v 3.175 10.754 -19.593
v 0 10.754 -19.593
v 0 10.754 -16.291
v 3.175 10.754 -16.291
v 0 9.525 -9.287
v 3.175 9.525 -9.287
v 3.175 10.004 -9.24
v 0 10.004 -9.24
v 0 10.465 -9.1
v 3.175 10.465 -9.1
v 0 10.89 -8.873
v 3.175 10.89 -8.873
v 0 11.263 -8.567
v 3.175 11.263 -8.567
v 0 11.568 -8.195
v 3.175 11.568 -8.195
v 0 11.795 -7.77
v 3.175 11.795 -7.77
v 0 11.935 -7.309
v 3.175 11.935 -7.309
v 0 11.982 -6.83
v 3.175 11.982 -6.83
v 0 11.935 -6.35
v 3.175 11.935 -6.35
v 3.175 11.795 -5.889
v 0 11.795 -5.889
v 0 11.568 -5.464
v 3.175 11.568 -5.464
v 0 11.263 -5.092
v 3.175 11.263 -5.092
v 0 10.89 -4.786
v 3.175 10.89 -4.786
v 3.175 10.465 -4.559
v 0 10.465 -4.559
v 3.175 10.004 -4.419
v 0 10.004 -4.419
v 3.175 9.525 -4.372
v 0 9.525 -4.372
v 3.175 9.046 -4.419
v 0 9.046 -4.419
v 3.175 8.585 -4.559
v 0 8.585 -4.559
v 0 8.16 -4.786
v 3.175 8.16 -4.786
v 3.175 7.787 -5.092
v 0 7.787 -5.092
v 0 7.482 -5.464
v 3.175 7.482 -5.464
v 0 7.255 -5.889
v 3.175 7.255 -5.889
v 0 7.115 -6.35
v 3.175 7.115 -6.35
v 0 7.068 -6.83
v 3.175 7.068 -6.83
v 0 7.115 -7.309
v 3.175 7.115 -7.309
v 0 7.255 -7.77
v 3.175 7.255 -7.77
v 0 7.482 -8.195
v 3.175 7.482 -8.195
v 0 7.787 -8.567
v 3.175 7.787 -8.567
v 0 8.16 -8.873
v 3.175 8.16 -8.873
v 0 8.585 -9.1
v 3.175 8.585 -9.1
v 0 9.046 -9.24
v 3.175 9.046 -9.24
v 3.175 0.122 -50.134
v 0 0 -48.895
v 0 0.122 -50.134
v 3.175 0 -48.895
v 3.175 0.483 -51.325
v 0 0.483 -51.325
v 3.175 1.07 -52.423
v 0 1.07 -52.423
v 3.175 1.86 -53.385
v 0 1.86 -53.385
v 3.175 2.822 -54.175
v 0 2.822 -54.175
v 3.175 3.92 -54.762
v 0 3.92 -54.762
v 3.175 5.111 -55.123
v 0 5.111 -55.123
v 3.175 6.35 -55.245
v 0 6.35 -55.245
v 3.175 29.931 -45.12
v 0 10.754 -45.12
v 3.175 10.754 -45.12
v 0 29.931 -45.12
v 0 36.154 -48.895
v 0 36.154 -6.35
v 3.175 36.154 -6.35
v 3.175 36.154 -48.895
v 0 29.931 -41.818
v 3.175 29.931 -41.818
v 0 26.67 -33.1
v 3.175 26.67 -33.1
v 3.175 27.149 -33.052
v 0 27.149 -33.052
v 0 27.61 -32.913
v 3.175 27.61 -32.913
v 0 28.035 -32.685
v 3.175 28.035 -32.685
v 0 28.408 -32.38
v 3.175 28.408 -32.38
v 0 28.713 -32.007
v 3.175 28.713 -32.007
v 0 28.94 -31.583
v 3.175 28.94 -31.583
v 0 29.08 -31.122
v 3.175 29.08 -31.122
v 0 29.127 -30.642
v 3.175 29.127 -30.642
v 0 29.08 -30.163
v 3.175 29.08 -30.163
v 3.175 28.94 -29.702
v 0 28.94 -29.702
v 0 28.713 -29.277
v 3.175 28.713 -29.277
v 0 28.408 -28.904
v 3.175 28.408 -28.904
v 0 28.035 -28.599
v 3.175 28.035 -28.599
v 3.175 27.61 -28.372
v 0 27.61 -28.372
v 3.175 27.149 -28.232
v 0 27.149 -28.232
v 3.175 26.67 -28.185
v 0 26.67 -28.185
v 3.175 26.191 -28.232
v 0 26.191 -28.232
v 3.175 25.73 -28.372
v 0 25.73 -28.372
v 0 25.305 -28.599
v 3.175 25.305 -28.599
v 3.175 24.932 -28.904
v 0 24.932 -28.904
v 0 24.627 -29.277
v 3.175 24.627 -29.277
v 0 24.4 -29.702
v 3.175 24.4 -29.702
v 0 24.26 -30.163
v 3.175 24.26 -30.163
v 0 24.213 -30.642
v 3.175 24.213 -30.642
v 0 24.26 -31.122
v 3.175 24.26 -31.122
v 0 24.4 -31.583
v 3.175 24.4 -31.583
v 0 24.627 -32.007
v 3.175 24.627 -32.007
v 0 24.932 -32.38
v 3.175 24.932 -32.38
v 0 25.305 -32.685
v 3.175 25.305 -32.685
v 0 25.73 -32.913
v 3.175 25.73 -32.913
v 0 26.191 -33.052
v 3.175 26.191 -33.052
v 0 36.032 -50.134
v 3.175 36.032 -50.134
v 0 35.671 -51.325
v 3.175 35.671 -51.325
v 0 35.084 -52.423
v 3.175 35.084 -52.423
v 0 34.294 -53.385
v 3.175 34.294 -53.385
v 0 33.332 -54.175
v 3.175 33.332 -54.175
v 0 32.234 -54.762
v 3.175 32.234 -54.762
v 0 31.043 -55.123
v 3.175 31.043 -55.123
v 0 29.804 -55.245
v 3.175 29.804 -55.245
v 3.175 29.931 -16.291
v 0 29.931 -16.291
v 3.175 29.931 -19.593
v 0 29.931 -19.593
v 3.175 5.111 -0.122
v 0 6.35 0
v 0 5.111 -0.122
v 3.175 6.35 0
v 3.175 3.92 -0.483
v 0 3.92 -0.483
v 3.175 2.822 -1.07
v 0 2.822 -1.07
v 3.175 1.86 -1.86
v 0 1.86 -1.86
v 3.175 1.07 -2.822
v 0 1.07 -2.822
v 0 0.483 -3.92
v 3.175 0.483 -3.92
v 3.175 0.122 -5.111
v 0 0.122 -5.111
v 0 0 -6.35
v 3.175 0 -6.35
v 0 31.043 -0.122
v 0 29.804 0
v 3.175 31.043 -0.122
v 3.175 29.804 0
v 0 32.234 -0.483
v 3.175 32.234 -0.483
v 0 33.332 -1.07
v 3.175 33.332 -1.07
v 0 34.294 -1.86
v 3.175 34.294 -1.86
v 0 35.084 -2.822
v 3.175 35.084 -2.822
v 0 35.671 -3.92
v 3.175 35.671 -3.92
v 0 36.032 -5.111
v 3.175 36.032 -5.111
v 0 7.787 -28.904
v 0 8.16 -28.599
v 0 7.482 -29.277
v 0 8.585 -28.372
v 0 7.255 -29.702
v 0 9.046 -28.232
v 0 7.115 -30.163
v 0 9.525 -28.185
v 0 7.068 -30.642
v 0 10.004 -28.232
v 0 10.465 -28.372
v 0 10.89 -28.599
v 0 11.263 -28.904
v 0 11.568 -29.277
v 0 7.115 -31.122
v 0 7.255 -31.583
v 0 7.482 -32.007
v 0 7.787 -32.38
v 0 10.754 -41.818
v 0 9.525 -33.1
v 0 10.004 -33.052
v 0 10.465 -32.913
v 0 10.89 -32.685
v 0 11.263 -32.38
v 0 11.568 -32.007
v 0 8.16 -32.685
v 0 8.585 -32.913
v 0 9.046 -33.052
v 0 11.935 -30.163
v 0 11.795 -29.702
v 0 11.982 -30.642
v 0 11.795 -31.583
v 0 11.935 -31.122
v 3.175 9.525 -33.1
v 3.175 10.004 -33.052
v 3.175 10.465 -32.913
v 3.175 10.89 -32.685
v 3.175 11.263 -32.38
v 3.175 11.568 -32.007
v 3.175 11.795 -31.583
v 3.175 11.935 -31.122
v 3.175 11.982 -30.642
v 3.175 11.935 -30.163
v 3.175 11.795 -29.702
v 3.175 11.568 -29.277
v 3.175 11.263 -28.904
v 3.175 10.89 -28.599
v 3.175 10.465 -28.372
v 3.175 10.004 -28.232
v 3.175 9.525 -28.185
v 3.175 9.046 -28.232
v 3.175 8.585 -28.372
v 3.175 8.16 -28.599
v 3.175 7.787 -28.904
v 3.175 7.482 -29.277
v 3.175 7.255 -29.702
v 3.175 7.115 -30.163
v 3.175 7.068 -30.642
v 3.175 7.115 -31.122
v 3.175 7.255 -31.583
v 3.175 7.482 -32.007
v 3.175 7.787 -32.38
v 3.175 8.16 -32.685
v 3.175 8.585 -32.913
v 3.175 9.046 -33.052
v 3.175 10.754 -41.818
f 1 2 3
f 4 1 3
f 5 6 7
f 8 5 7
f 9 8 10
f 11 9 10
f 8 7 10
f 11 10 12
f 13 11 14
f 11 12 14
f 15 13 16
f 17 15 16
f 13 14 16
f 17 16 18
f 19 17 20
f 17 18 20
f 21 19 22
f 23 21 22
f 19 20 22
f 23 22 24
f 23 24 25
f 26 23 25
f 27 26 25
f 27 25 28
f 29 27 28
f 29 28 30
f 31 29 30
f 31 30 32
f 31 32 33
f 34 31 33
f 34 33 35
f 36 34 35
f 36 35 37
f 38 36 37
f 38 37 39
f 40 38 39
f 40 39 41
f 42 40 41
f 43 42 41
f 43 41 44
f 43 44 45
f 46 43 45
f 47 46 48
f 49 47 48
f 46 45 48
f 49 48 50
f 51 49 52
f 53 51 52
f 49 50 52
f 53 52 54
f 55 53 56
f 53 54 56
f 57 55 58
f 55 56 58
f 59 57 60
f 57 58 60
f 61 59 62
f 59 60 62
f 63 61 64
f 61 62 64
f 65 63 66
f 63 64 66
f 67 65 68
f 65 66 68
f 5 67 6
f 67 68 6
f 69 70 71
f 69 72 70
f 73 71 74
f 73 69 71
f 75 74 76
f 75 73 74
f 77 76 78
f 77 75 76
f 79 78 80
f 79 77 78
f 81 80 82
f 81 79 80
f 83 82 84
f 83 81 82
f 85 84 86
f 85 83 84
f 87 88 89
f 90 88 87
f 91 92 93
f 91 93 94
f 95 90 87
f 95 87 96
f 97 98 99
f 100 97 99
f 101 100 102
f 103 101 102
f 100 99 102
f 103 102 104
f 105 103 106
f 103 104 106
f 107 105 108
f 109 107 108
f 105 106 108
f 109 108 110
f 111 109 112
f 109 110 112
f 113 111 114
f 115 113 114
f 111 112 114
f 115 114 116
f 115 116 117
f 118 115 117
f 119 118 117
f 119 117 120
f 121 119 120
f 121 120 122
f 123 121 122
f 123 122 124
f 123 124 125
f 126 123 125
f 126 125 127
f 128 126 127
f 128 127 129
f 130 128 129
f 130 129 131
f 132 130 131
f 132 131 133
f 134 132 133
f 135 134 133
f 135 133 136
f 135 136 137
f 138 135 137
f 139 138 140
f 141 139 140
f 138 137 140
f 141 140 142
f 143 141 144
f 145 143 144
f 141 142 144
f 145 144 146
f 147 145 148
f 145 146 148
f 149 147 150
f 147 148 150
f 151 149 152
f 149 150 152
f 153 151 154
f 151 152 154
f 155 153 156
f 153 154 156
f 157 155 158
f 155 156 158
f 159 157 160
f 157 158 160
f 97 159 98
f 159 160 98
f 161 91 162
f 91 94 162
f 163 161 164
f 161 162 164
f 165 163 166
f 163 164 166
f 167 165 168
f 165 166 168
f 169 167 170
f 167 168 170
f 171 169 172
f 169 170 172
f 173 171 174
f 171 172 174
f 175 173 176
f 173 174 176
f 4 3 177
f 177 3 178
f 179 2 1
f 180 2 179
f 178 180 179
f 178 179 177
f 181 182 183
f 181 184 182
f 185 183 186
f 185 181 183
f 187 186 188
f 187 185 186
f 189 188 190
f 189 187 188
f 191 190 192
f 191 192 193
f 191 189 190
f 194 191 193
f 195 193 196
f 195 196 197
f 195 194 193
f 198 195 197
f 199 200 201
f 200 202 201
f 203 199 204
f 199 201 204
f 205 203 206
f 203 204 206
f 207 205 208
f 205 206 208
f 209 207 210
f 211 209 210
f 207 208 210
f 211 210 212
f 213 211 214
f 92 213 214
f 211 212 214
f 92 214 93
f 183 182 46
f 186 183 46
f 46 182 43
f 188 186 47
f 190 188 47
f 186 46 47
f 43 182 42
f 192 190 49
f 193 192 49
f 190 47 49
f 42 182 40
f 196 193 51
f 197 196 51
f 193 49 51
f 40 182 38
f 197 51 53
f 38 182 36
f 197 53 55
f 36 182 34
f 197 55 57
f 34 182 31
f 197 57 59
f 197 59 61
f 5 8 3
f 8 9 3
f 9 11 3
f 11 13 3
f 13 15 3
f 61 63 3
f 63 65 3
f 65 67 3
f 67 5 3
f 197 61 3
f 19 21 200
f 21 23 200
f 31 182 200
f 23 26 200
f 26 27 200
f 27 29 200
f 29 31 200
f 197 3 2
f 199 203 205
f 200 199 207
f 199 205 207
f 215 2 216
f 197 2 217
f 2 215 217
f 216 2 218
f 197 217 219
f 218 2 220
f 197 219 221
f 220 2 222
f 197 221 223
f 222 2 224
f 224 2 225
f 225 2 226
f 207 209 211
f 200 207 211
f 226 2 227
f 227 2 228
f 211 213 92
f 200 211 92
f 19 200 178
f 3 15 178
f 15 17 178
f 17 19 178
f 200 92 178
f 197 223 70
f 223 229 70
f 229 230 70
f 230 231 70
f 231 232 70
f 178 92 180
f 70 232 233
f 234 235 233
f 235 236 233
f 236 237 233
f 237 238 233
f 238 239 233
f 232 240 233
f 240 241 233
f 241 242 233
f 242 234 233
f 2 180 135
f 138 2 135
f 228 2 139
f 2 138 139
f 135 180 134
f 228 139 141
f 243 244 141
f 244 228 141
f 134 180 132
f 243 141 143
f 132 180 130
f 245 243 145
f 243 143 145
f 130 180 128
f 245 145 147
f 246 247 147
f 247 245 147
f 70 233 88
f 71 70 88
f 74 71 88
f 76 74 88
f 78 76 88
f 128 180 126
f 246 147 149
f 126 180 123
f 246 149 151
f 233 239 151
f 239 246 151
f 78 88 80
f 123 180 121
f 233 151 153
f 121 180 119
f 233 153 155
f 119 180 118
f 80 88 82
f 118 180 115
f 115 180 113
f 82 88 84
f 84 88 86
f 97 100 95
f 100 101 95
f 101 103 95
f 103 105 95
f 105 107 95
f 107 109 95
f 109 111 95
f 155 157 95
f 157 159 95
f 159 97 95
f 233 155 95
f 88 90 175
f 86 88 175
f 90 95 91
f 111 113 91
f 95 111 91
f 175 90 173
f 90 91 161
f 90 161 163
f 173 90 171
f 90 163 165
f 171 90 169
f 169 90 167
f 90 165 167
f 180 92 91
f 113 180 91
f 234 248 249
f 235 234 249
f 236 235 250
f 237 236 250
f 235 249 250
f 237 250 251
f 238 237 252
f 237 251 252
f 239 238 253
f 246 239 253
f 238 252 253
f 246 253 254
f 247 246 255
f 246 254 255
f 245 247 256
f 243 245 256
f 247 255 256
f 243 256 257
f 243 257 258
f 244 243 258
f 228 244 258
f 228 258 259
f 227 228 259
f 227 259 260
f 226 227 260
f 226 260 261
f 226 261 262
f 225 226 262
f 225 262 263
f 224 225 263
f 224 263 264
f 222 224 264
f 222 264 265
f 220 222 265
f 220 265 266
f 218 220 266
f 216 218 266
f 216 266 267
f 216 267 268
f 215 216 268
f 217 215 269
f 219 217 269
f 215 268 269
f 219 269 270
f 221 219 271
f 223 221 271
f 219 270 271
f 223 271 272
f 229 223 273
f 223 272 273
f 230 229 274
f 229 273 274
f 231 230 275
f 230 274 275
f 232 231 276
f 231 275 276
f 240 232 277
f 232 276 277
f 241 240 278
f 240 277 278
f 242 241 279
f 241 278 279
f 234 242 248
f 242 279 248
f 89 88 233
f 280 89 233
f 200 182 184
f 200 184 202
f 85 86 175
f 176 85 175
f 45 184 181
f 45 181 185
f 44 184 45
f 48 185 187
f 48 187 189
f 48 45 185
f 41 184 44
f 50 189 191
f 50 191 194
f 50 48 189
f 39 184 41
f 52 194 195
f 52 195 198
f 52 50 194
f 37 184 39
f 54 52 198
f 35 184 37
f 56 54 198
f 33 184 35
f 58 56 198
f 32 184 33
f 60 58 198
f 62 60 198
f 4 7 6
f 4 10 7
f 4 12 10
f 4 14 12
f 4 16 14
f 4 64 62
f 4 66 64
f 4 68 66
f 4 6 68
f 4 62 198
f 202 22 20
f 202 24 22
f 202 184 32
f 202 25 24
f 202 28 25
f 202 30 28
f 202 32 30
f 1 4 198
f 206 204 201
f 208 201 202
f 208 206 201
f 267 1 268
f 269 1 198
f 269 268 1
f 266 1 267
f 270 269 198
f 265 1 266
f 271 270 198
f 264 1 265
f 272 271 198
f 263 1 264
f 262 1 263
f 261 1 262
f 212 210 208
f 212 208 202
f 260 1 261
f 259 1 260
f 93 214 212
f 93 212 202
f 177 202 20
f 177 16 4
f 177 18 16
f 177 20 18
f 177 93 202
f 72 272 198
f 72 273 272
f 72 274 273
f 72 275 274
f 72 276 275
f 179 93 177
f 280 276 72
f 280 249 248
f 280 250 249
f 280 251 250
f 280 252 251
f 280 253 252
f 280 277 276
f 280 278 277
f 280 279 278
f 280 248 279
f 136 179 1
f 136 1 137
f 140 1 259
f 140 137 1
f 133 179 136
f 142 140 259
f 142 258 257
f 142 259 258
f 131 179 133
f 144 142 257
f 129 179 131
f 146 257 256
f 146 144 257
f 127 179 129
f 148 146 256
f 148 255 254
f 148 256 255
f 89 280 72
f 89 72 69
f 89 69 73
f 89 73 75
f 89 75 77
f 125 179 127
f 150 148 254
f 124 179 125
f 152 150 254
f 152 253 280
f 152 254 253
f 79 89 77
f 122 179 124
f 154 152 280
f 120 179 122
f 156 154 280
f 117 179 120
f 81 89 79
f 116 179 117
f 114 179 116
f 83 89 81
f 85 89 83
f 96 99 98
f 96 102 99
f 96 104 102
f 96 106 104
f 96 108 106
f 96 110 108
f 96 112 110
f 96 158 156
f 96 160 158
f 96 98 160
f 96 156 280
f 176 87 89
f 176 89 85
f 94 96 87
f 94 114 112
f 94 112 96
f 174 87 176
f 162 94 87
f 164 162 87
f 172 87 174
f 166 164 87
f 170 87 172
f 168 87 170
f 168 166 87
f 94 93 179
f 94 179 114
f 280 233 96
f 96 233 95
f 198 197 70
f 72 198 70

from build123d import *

# Parameters (mm, degrees)
SKETCH1_W                        = 55.245
SKETCH1_H                        = 36.15436
BOSS_EXTRUDE1_DEPTH              = 3.175
SKETCH7_W                        = 3.302
SKETCH7_H                        = 19.177
CUT_EXTRUDE1_DEPTH               = 3.175
FILLET1_R                        = 6.35
F_10_0_1935_DIAMETER_HOLE2_D     = 4.9149
F_10_0_1935_DIAMETER_HOLE2_DEPTH = 9.699415072
F_10_0_1935_DIAMETER_HOLE2_TIP   = 1.476584928


with BuildPart() as part:
    # Sketch1 → Boss-Extrude1 (new body)
    with BuildSketch(Plane(origin=(0, 0, 0), x_dir=(0, 0, -1), z_dir=(1, 0, 0))):
        with Locations((27.6225, 18.07718)):
            Rectangle(SKETCH1_W, SKETCH1_H)
    extrude(amount=BOSS_EXTRUDE1_DEPTH)

    # Sketch7 → Cut-Extrude1 (cut)
    with BuildSketch(Plane.ZY):
        with Locations((-43.469153092, 20.34286)):
            Rectangle(SKETCH7_W, SKETCH7_H)
        with Locations((-17.942153092, 20.34286)):
            Rectangle(SKETCH7_W, SKETCH7_H)
    extrude(amount=-CUT_EXTRUDE1_DEPTH, mode=Mode.SUBTRACT)

    # Fillet1
    fillet1_edges = [part.edges().sort_by_distance(p)[0] for p in [
        (1.5875, 0, 0),
        (1.5875, 36.15436, 0),
        (1.5875, 36.15436, -55.245),
        (1.5875, 0, -55.245),
    ]]
    fillet(fillet1_edges, radius=FILLET1_R)

    # #10 (0.1935) Diameter Hole2
    with Locations(Plane.ZY):
        with Locations((-30.642153092, 9.525), (-30.642153092, 26.67), (-6.829653092, 9.525)):
            Hole(F_10_0_1935_DIAMETER_HOLE2_D / 2, depth=F_10_0_1935_DIAMETER_HOLE2_DEPTH)
            with Locations((0, 0, -(F_10_0_1935_DIAMETER_HOLE2_DEPTH + F_10_0_1935_DIAMETER_HOLE2_TIP / 2))):  # 118° drill point
                Cone(0, F_10_0_1935_DIAMETER_HOLE2_D / 2, F_10_0_1935_DIAMETER_HOLE2_TIP, mode=Mode.SUBTRACT)


solid = part.part
